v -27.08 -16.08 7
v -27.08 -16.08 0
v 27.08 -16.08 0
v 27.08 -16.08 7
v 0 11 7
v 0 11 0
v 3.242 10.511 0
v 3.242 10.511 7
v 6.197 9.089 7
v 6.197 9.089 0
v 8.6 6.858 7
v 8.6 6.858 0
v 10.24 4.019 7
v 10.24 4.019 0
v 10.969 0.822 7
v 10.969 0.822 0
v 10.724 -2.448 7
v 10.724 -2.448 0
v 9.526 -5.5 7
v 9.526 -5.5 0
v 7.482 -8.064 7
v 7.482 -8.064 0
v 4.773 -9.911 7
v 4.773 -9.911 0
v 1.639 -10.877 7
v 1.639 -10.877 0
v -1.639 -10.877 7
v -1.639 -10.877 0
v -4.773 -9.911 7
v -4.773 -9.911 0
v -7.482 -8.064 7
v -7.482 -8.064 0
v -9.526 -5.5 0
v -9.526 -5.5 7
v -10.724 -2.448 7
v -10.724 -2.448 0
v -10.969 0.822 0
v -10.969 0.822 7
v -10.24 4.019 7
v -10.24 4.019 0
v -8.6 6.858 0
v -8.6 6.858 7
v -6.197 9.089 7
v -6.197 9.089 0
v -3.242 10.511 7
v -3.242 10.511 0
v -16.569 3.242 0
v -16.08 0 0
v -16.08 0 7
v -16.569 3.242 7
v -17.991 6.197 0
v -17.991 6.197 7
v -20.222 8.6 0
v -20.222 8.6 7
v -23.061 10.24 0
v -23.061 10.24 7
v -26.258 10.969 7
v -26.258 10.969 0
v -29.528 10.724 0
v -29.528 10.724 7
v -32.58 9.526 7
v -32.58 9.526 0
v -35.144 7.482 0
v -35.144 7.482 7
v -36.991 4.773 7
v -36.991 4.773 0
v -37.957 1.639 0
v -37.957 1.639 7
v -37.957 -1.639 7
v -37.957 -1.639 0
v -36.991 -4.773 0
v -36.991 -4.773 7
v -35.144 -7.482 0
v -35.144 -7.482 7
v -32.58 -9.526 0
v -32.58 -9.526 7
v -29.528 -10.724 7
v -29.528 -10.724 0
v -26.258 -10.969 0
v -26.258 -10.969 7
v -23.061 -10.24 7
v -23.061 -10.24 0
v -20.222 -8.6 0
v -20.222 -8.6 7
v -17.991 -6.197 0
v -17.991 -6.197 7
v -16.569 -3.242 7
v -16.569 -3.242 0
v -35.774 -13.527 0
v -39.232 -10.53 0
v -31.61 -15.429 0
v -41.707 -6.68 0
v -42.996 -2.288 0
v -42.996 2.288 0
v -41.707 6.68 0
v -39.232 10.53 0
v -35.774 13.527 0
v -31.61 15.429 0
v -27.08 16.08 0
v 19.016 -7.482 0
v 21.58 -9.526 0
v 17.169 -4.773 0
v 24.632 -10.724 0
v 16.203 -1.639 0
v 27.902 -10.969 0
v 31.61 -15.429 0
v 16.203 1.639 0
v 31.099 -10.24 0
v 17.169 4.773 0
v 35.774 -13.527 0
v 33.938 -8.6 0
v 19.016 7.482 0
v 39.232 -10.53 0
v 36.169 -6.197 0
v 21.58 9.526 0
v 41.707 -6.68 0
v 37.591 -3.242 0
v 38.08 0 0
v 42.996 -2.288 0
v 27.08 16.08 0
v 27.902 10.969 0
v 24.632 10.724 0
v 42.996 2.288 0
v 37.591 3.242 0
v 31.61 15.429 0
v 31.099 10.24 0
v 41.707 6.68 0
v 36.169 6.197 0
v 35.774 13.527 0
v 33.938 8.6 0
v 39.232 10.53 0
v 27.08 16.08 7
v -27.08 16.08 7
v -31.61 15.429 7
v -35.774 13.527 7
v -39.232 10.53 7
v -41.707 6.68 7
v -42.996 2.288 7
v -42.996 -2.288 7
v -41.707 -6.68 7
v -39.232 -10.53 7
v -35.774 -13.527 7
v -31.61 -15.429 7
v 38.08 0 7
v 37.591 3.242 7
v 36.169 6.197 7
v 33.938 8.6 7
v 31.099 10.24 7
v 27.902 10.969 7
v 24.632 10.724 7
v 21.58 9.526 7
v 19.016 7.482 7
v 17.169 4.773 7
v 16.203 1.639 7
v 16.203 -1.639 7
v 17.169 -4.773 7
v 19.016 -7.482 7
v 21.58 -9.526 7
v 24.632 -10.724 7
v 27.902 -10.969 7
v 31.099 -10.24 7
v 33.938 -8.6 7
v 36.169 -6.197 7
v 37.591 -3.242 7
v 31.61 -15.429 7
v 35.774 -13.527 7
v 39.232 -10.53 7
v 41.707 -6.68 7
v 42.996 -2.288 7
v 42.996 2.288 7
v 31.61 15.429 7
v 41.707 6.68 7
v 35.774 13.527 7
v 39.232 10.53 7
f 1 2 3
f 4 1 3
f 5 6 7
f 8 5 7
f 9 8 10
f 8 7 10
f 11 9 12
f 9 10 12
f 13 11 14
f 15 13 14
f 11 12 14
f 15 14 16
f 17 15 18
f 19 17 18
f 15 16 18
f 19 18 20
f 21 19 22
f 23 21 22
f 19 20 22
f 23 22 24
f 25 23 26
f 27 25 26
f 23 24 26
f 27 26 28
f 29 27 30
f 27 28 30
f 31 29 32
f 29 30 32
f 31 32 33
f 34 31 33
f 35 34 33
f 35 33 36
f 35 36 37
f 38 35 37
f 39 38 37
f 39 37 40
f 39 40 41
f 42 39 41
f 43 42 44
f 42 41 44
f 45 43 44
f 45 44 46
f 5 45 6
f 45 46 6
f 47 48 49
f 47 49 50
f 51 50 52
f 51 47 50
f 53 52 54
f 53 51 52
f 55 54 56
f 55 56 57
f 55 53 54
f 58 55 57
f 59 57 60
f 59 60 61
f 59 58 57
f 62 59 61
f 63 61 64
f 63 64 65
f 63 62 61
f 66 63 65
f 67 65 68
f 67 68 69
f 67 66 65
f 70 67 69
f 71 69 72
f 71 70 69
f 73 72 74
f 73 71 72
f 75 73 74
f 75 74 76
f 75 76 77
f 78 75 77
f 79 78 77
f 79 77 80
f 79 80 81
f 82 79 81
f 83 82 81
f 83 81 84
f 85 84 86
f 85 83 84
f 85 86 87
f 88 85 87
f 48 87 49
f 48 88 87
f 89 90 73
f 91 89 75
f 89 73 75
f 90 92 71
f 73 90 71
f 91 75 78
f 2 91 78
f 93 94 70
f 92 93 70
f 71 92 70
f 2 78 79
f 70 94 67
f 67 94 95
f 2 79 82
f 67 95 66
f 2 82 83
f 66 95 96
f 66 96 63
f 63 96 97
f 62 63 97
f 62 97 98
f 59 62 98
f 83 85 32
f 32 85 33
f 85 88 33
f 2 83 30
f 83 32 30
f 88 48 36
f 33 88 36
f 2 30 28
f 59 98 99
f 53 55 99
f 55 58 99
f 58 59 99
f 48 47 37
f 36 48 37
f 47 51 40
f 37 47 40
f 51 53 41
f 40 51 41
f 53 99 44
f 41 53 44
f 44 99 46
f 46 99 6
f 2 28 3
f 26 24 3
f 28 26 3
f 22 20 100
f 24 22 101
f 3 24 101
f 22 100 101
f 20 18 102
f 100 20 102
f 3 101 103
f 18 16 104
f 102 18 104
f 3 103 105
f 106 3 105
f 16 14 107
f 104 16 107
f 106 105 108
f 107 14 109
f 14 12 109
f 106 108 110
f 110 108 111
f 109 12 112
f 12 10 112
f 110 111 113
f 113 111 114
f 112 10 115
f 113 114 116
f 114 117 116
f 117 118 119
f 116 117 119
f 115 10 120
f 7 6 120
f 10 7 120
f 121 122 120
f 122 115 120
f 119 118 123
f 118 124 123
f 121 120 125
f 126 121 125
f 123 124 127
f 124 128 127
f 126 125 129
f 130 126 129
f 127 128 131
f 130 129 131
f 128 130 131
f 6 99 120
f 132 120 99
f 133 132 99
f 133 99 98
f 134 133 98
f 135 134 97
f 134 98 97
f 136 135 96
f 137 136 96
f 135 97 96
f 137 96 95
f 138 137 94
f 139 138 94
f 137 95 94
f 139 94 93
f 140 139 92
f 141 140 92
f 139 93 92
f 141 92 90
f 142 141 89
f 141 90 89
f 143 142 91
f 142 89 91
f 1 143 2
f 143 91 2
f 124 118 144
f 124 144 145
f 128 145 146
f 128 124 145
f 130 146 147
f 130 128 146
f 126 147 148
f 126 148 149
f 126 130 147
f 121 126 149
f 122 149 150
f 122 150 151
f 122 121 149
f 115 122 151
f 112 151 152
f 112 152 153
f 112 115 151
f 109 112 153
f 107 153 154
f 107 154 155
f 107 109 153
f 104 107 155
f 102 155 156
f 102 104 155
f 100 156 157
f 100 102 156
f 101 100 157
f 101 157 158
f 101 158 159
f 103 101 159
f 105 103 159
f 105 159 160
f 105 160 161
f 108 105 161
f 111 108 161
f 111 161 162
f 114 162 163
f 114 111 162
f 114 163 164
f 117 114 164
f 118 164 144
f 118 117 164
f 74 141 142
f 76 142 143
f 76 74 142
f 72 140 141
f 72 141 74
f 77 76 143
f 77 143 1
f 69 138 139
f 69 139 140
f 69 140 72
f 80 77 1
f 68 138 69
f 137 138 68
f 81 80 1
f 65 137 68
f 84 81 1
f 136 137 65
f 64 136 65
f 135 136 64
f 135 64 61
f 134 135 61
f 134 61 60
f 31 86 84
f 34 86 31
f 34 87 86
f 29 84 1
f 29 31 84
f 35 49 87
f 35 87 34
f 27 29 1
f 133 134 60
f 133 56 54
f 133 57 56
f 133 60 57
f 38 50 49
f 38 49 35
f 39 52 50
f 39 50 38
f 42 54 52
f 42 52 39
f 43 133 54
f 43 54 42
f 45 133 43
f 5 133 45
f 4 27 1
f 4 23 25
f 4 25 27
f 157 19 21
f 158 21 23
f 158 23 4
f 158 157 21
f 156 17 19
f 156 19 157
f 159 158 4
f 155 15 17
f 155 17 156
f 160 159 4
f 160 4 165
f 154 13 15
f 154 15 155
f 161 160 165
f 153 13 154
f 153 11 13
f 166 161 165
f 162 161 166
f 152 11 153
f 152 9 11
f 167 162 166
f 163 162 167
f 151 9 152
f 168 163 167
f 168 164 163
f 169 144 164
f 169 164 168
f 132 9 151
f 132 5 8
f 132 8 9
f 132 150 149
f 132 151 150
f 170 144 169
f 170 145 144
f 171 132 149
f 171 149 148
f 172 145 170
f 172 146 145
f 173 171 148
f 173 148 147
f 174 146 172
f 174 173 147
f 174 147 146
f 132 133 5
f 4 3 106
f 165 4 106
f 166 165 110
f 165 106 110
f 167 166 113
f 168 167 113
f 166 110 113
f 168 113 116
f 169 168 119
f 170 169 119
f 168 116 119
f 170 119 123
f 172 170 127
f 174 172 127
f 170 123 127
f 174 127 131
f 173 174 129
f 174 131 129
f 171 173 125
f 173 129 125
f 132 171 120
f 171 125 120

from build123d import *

# Parameters (mm, degrees)
F0_R     = 11
F1_DEPTH = 7


with BuildPart() as f1:
    # F0 (on Top) → F1 (new body)
    with BuildSketch(Plane.XY):
        with BuildLine():
            ThreePointArc((-27.08, 16.08), (-43.16, 0), (-27.08, -16.08))
            Line((-27.08, -16.08), (27.08, -16.08))
            ThreePointArc((27.08, -16.08), (43.16, 0), (27.08, 16.08))
            Line((27.08, 16.08), (-27.08, 16.08))
        make_face()
        with Locations((-27.08, 0)):
            Circle(F0_R, mode=Mode.SUBTRACT)
        with BuildLine():
            ThreePointArc((0, -11), (-11, 0), (0, 11))
            ThreePointArc((0, 11), (11, 0), (0, -11))
        make_face(mode=Mode.SUBTRACT)
        with Locations((27.08, 0)):
            Circle(F0_R, mode=Mode.SUBTRACT)
    extrude(amount=F1_DEPTH)


solid = f1.part
